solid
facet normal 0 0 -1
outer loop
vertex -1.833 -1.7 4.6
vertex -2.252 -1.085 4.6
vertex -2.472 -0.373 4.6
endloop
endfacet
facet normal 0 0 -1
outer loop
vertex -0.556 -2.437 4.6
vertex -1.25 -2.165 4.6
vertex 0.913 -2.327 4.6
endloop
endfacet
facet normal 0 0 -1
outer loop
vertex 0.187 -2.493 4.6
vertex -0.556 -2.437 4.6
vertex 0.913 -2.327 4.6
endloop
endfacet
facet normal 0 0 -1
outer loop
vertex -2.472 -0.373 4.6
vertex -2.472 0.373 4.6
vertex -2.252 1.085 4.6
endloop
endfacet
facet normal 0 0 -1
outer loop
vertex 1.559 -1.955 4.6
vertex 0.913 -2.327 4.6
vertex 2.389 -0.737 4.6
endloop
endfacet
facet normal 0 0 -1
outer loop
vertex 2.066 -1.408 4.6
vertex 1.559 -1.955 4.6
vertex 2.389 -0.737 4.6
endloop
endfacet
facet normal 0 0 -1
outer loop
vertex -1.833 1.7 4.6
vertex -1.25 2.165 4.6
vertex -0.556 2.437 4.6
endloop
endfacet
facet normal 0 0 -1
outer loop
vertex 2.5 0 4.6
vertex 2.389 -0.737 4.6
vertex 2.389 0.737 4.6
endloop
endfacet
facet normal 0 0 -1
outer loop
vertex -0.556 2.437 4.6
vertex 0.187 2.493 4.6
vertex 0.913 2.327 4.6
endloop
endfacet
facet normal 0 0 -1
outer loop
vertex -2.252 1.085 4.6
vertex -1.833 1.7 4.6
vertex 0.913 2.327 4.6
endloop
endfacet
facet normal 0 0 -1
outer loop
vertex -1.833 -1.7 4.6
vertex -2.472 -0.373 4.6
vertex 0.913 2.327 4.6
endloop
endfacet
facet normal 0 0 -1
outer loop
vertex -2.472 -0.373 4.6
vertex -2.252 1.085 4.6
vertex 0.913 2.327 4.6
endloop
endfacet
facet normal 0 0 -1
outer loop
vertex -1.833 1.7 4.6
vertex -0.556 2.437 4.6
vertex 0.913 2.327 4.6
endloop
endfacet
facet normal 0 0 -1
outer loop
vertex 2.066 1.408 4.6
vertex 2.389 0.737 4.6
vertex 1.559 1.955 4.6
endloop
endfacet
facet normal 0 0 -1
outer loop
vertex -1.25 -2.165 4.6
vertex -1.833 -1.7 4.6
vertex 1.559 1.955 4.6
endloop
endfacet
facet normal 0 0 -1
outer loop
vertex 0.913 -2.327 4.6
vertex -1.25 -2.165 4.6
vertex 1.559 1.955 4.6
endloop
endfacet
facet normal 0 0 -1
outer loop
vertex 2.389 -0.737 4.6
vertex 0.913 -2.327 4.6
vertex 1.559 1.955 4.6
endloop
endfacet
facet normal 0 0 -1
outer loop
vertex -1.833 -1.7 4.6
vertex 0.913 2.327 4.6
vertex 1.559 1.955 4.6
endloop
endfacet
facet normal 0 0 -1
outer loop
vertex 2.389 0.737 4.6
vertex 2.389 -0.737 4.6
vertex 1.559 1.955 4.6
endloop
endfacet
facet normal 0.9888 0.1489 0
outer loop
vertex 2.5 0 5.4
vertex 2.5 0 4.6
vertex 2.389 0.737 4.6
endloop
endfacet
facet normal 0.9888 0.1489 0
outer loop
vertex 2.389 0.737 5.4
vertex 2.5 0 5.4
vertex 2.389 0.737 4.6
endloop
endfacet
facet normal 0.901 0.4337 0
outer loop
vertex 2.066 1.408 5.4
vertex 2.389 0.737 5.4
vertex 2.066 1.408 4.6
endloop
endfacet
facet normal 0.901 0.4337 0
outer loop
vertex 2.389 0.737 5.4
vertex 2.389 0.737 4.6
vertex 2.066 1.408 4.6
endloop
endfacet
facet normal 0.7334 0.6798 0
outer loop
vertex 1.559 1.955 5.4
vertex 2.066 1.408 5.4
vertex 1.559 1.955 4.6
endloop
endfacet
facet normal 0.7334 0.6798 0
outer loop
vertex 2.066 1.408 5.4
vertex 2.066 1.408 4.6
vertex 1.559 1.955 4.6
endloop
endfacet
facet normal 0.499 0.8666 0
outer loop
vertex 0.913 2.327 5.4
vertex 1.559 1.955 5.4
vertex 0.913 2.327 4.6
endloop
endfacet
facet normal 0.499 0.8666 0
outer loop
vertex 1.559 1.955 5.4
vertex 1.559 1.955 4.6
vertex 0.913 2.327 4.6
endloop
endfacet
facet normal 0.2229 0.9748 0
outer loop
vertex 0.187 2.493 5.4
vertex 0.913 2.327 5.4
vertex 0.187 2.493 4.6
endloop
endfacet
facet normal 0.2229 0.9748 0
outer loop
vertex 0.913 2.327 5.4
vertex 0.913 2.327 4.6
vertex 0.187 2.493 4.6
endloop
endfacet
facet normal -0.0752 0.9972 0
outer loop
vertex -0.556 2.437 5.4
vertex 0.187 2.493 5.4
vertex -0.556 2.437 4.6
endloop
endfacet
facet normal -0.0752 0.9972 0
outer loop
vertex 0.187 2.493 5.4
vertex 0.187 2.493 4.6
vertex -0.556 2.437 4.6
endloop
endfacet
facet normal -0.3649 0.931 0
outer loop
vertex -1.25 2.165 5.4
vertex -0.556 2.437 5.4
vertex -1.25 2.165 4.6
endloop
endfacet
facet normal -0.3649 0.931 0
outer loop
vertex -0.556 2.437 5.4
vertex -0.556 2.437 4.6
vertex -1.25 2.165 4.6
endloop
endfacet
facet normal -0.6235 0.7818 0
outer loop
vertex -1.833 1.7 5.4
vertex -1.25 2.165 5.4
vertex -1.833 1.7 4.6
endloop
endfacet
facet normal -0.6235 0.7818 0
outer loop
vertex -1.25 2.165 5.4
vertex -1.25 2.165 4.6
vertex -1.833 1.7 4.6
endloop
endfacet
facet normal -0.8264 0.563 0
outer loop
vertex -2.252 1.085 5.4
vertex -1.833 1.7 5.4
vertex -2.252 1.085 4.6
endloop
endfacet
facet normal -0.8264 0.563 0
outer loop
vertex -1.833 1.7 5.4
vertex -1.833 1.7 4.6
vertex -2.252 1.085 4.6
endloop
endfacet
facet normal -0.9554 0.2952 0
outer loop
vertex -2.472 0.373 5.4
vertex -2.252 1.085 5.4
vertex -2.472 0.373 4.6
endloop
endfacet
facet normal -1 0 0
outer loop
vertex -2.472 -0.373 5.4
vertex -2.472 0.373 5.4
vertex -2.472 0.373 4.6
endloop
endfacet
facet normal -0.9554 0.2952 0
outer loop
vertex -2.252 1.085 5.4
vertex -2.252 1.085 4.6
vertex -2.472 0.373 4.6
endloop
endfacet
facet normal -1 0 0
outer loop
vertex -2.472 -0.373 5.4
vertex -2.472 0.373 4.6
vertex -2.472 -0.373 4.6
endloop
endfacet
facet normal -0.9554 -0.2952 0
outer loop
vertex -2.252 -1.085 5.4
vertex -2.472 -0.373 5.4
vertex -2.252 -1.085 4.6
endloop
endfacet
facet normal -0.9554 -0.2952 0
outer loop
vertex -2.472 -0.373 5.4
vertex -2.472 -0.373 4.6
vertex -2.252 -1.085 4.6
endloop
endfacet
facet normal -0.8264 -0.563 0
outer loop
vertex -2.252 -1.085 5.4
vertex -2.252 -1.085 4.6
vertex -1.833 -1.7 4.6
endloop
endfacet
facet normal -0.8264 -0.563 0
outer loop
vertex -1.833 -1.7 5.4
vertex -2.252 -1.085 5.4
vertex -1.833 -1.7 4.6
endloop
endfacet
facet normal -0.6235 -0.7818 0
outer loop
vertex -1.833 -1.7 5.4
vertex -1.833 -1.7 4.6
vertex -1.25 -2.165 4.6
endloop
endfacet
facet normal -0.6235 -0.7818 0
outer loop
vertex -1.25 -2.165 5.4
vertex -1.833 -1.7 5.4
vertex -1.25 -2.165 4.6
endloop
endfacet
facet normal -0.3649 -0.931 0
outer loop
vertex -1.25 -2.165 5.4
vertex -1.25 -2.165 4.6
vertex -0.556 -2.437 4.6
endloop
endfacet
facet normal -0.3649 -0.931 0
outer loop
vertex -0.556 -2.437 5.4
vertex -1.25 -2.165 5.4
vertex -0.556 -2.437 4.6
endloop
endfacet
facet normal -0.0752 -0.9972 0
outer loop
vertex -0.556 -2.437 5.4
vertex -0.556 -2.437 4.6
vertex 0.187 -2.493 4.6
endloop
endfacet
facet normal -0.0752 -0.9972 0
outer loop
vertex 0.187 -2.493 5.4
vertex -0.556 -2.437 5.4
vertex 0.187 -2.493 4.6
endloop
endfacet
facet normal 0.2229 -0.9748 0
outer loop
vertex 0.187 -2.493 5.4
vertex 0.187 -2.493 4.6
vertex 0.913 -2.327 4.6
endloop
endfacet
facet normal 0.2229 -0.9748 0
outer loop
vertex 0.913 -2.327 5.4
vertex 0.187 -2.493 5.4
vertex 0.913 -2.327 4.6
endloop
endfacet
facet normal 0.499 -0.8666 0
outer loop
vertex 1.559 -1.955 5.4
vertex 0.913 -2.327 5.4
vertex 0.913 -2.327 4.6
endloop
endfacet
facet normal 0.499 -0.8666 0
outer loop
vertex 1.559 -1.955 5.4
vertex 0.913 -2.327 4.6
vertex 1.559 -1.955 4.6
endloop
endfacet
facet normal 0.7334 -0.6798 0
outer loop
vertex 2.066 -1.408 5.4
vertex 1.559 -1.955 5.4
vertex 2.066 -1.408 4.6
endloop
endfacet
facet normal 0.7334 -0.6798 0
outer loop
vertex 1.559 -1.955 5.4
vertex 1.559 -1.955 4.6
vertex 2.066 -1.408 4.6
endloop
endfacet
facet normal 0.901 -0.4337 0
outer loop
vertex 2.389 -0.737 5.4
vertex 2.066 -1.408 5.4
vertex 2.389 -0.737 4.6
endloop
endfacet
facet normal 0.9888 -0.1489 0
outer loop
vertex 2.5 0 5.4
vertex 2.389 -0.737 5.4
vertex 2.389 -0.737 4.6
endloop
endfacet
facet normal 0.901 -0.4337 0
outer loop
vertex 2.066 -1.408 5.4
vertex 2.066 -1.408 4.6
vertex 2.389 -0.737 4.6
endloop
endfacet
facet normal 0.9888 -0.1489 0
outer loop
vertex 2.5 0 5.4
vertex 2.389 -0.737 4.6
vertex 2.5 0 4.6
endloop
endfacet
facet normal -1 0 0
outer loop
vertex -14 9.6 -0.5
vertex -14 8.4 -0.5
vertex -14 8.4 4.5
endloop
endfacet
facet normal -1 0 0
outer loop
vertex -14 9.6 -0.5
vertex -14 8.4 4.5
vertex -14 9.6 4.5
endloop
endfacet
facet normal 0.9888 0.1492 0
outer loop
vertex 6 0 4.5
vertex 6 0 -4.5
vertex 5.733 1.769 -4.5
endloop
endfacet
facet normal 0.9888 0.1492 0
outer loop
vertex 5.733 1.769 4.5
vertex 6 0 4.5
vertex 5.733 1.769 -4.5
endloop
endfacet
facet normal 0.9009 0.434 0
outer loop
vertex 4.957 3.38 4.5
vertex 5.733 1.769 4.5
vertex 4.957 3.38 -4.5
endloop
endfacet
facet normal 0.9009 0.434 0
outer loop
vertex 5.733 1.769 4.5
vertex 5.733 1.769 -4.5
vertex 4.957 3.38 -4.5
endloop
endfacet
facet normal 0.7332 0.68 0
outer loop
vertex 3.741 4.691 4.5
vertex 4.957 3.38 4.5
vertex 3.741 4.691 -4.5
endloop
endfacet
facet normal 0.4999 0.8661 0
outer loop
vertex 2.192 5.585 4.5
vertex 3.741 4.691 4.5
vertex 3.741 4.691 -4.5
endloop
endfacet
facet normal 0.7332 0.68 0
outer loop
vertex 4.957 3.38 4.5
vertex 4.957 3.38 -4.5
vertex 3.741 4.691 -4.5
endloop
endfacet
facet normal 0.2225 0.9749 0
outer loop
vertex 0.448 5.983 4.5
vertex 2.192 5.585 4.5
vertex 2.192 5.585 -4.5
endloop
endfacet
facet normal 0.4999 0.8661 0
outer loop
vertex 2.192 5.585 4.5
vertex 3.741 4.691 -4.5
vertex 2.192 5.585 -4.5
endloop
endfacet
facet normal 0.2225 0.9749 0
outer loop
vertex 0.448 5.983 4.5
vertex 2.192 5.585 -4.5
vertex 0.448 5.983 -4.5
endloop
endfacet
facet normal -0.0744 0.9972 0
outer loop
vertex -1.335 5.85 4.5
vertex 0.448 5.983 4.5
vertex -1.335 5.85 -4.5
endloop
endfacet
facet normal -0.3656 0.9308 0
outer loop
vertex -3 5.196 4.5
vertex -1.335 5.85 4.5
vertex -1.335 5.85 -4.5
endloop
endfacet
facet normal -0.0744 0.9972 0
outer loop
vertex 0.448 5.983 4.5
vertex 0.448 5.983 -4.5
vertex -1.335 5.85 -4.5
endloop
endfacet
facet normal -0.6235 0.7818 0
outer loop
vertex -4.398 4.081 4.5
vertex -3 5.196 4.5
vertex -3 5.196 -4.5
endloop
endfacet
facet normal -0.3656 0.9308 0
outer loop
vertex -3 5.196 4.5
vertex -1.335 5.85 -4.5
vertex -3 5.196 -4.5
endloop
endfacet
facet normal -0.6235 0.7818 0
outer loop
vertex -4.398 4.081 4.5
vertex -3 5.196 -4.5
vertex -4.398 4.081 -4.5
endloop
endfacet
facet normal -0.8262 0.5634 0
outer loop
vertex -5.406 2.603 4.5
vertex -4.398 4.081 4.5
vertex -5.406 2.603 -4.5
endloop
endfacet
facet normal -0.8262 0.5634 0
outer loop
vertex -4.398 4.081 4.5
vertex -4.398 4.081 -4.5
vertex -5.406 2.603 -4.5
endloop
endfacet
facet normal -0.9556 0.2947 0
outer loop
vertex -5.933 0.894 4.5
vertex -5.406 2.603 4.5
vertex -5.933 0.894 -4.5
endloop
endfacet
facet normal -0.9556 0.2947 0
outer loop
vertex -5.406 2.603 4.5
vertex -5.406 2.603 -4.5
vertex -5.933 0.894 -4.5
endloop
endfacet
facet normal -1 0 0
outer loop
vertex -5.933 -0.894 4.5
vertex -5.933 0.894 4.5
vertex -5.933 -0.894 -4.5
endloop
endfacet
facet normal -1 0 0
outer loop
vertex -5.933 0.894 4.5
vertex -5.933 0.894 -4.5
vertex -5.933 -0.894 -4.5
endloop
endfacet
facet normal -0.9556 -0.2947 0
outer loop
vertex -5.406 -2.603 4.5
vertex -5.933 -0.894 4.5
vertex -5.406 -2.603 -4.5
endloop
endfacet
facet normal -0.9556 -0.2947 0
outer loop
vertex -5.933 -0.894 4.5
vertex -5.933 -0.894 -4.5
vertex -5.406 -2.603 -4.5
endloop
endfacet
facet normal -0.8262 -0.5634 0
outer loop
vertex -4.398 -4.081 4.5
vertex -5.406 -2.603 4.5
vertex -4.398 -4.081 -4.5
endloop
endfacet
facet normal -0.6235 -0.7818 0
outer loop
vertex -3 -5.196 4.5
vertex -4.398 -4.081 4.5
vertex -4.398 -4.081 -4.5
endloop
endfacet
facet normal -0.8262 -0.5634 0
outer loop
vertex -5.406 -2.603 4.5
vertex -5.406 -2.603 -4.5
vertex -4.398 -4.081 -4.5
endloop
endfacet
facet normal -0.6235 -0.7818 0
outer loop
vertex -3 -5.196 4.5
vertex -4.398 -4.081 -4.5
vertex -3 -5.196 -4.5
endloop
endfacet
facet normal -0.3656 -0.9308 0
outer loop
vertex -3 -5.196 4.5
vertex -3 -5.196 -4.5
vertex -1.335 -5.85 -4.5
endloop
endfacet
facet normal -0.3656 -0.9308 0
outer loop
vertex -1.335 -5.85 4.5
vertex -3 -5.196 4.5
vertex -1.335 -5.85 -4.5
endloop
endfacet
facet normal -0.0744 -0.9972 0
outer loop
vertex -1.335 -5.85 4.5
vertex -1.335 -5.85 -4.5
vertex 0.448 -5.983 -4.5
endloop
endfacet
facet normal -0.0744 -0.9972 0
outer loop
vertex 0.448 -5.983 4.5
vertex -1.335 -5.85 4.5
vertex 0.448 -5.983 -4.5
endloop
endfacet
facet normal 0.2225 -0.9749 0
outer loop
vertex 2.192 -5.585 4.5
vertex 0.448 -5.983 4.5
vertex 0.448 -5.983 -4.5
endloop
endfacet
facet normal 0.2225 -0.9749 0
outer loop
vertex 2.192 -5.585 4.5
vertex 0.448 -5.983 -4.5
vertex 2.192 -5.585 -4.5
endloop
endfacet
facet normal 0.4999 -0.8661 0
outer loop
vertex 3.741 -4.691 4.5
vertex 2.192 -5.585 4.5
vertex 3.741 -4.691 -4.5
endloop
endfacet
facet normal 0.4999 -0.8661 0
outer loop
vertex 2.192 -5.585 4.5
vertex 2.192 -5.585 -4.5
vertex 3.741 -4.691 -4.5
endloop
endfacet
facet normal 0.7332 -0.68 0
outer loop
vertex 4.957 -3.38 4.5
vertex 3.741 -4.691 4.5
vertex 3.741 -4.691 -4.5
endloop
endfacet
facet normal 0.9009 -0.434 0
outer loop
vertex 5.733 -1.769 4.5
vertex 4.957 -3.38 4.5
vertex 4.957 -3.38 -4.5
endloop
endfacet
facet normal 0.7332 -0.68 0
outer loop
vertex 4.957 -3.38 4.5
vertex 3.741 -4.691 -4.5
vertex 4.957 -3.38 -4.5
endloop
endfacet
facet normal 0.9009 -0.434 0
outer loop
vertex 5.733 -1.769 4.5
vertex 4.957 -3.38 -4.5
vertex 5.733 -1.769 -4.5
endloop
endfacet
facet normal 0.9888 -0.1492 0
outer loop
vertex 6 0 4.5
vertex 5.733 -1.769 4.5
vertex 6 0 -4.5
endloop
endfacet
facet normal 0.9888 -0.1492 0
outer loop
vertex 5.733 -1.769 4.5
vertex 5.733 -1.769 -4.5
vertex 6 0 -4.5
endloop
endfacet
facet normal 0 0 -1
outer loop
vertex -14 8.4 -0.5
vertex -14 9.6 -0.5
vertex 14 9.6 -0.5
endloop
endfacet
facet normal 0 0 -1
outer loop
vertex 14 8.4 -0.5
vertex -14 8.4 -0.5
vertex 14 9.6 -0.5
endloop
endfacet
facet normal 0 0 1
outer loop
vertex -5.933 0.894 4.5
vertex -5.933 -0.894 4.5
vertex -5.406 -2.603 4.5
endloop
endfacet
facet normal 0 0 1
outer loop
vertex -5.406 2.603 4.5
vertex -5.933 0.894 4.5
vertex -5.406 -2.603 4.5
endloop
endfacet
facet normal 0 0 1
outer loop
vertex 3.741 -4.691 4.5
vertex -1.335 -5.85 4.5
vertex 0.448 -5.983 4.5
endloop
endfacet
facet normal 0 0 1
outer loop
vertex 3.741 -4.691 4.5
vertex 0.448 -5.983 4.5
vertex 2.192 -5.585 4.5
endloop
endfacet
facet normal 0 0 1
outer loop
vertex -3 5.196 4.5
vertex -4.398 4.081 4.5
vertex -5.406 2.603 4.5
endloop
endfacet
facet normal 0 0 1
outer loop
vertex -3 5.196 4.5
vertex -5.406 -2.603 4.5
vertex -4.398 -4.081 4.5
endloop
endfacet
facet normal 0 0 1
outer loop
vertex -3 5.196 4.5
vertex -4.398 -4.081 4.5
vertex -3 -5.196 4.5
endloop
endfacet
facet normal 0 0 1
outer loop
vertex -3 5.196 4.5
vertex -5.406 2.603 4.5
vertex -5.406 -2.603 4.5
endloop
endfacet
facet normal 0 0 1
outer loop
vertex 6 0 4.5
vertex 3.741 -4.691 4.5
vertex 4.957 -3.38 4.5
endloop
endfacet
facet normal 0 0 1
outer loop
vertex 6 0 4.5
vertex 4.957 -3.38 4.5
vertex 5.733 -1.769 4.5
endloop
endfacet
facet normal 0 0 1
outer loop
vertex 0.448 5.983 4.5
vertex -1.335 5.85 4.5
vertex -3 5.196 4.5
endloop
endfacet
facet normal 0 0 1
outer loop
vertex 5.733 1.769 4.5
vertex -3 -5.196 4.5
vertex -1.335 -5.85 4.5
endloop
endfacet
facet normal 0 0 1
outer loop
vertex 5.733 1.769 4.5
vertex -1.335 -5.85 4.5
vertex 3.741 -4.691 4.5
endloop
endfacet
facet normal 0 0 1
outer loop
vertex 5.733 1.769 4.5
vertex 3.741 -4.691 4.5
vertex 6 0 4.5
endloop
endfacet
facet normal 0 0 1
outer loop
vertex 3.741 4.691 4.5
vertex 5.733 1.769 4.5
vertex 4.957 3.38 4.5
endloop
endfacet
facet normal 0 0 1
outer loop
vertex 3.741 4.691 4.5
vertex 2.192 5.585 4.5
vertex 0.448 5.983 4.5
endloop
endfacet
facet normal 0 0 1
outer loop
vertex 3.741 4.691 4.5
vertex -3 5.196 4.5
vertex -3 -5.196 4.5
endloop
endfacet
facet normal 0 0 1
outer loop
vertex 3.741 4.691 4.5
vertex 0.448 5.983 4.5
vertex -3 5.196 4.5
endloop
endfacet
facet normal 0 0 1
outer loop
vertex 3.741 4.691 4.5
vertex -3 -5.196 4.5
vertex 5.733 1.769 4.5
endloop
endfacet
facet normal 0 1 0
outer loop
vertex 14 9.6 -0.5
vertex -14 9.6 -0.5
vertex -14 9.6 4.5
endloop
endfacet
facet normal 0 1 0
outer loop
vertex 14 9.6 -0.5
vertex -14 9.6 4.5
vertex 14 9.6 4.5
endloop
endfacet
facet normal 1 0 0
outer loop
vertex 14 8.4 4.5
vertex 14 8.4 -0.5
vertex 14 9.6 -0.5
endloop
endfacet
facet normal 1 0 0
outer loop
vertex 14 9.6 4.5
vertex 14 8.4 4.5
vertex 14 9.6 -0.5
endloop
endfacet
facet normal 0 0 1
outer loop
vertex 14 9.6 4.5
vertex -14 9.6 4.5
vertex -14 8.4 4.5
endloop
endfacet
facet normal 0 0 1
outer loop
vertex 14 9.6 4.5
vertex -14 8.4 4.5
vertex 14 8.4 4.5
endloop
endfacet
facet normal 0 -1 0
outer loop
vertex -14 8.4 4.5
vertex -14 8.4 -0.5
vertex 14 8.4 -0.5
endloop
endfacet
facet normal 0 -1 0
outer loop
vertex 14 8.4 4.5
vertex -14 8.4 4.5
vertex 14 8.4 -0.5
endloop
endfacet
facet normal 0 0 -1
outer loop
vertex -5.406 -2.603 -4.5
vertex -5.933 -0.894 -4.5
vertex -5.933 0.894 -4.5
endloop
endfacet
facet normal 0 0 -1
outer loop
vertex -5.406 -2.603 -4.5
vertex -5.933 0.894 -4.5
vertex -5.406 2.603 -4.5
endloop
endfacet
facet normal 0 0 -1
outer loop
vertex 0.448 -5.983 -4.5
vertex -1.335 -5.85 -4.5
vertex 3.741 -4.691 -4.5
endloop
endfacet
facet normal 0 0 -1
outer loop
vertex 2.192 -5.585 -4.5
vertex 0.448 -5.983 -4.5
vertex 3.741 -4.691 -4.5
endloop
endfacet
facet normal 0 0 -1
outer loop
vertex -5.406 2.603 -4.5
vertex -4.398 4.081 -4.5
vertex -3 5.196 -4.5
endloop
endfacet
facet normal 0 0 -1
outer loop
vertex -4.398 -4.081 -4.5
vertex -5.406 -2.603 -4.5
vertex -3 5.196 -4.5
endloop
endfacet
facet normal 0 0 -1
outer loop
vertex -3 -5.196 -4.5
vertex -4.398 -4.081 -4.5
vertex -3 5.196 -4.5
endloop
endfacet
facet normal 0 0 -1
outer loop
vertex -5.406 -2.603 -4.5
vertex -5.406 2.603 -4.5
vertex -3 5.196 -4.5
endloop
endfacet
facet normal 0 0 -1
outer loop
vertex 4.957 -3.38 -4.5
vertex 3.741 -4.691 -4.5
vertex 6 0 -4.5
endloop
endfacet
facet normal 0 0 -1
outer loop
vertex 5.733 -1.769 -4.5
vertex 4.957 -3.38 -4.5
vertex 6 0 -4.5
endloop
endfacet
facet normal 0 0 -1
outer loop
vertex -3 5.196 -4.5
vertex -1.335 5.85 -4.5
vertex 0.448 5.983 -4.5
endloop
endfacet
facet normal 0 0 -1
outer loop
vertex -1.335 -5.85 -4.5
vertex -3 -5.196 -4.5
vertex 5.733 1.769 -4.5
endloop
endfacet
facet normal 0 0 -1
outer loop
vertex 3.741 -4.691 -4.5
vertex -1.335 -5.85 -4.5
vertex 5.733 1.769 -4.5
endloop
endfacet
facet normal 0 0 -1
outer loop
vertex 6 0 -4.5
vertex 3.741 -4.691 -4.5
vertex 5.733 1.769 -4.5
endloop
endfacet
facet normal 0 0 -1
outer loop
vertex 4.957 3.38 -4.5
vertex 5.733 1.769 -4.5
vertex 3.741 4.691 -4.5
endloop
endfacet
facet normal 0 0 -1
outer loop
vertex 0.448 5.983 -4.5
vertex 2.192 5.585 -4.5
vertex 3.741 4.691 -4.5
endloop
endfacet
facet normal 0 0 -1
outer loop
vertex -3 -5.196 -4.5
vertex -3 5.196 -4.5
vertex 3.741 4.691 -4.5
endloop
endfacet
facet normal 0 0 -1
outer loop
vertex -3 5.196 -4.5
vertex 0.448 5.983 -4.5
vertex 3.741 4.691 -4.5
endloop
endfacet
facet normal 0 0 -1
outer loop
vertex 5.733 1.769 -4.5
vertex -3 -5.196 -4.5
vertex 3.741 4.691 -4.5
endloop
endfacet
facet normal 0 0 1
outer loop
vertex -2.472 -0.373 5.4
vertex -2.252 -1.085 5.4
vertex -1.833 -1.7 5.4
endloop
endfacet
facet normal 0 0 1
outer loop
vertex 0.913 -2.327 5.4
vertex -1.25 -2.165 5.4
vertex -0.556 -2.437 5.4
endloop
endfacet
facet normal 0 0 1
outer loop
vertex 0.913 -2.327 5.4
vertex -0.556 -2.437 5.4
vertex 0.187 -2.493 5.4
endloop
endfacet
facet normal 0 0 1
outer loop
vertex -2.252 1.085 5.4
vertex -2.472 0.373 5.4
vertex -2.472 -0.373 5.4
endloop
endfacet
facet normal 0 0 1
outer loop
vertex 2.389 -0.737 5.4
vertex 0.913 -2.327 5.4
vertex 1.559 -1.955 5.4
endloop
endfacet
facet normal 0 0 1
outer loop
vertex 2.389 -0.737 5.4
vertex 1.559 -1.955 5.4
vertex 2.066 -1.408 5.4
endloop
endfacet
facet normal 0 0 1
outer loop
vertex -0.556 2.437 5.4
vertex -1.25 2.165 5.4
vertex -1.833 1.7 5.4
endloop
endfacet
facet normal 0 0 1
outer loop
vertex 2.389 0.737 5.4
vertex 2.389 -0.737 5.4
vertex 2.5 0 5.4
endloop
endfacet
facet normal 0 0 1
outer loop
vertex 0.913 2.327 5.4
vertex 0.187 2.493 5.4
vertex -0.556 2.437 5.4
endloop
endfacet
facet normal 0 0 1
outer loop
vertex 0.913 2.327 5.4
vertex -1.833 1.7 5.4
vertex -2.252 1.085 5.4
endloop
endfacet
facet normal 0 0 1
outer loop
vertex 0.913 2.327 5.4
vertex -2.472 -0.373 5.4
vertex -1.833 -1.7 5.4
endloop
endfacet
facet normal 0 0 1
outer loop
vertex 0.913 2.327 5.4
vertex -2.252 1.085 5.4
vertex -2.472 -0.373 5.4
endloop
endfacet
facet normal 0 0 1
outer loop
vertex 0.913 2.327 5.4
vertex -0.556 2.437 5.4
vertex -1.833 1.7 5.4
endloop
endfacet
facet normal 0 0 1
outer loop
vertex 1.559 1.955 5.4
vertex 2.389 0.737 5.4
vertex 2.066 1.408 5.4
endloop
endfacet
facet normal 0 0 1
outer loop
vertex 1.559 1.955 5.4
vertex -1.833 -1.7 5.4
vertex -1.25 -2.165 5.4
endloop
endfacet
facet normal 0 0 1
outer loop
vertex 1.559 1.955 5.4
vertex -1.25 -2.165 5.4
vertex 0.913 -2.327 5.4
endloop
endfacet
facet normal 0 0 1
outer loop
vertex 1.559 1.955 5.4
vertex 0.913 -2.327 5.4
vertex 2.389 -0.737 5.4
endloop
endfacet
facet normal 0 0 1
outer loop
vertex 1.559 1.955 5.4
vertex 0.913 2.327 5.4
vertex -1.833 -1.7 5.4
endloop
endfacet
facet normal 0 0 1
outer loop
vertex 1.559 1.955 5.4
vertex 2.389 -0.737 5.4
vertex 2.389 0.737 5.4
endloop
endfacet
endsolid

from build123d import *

# Parameters (mm, degrees)
ACTIVE_START                      = -4.5
SKETCH_1_R                        = 6
ACTIVE_BUZZER_DIA_12_X_9_MM_DEPTH = 9
SOUND_START                       = 4.6
SKETCH_2_R                        = 2.5
SOUND_OUTLET_MARKER_DEPTH         = 0.8
BUZZER_START                      = -0.5
SKETCH_3_W                        = 28
SKETCH_3_H                        = 1.2
BUZZER_LABEL_PLATE_BUZZER_DEPTH   = 5


with BuildPart() as part:
    # 草图1 → active buzzer - dia 12 x 9 mm (new body)
    with BuildSketch(Plane.XY.offset(ACTIVE_START)):
        Circle(SKETCH_1_R)
    extrude(amount=ACTIVE_BUZZER_DIA_12_X_9_MM_DEPTH)


with BuildPart() as body_2:
    # 草图2 → sound outlet marker (new body)
    with BuildSketch(Plane.XY.offset(SOUND_START)):
        Circle(SKETCH_2_R)
    extrude(amount=SOUND_OUTLET_MARKER_DEPTH)


with BuildPart() as body_3:
    # 草图3 → buzzer label plate - BUZZER (new body)
    with BuildSketch(Plane.XY.offset(BUZZER_START)):
        with Locations((0, 9)):
            Rectangle(SKETCH_3_W, SKETCH_3_H)
    extrude(amount=BUZZER_LABEL_PLATE_BUZZER_DEPTH)


solid = Compound([part.part, body_2.part, body_3.part])
